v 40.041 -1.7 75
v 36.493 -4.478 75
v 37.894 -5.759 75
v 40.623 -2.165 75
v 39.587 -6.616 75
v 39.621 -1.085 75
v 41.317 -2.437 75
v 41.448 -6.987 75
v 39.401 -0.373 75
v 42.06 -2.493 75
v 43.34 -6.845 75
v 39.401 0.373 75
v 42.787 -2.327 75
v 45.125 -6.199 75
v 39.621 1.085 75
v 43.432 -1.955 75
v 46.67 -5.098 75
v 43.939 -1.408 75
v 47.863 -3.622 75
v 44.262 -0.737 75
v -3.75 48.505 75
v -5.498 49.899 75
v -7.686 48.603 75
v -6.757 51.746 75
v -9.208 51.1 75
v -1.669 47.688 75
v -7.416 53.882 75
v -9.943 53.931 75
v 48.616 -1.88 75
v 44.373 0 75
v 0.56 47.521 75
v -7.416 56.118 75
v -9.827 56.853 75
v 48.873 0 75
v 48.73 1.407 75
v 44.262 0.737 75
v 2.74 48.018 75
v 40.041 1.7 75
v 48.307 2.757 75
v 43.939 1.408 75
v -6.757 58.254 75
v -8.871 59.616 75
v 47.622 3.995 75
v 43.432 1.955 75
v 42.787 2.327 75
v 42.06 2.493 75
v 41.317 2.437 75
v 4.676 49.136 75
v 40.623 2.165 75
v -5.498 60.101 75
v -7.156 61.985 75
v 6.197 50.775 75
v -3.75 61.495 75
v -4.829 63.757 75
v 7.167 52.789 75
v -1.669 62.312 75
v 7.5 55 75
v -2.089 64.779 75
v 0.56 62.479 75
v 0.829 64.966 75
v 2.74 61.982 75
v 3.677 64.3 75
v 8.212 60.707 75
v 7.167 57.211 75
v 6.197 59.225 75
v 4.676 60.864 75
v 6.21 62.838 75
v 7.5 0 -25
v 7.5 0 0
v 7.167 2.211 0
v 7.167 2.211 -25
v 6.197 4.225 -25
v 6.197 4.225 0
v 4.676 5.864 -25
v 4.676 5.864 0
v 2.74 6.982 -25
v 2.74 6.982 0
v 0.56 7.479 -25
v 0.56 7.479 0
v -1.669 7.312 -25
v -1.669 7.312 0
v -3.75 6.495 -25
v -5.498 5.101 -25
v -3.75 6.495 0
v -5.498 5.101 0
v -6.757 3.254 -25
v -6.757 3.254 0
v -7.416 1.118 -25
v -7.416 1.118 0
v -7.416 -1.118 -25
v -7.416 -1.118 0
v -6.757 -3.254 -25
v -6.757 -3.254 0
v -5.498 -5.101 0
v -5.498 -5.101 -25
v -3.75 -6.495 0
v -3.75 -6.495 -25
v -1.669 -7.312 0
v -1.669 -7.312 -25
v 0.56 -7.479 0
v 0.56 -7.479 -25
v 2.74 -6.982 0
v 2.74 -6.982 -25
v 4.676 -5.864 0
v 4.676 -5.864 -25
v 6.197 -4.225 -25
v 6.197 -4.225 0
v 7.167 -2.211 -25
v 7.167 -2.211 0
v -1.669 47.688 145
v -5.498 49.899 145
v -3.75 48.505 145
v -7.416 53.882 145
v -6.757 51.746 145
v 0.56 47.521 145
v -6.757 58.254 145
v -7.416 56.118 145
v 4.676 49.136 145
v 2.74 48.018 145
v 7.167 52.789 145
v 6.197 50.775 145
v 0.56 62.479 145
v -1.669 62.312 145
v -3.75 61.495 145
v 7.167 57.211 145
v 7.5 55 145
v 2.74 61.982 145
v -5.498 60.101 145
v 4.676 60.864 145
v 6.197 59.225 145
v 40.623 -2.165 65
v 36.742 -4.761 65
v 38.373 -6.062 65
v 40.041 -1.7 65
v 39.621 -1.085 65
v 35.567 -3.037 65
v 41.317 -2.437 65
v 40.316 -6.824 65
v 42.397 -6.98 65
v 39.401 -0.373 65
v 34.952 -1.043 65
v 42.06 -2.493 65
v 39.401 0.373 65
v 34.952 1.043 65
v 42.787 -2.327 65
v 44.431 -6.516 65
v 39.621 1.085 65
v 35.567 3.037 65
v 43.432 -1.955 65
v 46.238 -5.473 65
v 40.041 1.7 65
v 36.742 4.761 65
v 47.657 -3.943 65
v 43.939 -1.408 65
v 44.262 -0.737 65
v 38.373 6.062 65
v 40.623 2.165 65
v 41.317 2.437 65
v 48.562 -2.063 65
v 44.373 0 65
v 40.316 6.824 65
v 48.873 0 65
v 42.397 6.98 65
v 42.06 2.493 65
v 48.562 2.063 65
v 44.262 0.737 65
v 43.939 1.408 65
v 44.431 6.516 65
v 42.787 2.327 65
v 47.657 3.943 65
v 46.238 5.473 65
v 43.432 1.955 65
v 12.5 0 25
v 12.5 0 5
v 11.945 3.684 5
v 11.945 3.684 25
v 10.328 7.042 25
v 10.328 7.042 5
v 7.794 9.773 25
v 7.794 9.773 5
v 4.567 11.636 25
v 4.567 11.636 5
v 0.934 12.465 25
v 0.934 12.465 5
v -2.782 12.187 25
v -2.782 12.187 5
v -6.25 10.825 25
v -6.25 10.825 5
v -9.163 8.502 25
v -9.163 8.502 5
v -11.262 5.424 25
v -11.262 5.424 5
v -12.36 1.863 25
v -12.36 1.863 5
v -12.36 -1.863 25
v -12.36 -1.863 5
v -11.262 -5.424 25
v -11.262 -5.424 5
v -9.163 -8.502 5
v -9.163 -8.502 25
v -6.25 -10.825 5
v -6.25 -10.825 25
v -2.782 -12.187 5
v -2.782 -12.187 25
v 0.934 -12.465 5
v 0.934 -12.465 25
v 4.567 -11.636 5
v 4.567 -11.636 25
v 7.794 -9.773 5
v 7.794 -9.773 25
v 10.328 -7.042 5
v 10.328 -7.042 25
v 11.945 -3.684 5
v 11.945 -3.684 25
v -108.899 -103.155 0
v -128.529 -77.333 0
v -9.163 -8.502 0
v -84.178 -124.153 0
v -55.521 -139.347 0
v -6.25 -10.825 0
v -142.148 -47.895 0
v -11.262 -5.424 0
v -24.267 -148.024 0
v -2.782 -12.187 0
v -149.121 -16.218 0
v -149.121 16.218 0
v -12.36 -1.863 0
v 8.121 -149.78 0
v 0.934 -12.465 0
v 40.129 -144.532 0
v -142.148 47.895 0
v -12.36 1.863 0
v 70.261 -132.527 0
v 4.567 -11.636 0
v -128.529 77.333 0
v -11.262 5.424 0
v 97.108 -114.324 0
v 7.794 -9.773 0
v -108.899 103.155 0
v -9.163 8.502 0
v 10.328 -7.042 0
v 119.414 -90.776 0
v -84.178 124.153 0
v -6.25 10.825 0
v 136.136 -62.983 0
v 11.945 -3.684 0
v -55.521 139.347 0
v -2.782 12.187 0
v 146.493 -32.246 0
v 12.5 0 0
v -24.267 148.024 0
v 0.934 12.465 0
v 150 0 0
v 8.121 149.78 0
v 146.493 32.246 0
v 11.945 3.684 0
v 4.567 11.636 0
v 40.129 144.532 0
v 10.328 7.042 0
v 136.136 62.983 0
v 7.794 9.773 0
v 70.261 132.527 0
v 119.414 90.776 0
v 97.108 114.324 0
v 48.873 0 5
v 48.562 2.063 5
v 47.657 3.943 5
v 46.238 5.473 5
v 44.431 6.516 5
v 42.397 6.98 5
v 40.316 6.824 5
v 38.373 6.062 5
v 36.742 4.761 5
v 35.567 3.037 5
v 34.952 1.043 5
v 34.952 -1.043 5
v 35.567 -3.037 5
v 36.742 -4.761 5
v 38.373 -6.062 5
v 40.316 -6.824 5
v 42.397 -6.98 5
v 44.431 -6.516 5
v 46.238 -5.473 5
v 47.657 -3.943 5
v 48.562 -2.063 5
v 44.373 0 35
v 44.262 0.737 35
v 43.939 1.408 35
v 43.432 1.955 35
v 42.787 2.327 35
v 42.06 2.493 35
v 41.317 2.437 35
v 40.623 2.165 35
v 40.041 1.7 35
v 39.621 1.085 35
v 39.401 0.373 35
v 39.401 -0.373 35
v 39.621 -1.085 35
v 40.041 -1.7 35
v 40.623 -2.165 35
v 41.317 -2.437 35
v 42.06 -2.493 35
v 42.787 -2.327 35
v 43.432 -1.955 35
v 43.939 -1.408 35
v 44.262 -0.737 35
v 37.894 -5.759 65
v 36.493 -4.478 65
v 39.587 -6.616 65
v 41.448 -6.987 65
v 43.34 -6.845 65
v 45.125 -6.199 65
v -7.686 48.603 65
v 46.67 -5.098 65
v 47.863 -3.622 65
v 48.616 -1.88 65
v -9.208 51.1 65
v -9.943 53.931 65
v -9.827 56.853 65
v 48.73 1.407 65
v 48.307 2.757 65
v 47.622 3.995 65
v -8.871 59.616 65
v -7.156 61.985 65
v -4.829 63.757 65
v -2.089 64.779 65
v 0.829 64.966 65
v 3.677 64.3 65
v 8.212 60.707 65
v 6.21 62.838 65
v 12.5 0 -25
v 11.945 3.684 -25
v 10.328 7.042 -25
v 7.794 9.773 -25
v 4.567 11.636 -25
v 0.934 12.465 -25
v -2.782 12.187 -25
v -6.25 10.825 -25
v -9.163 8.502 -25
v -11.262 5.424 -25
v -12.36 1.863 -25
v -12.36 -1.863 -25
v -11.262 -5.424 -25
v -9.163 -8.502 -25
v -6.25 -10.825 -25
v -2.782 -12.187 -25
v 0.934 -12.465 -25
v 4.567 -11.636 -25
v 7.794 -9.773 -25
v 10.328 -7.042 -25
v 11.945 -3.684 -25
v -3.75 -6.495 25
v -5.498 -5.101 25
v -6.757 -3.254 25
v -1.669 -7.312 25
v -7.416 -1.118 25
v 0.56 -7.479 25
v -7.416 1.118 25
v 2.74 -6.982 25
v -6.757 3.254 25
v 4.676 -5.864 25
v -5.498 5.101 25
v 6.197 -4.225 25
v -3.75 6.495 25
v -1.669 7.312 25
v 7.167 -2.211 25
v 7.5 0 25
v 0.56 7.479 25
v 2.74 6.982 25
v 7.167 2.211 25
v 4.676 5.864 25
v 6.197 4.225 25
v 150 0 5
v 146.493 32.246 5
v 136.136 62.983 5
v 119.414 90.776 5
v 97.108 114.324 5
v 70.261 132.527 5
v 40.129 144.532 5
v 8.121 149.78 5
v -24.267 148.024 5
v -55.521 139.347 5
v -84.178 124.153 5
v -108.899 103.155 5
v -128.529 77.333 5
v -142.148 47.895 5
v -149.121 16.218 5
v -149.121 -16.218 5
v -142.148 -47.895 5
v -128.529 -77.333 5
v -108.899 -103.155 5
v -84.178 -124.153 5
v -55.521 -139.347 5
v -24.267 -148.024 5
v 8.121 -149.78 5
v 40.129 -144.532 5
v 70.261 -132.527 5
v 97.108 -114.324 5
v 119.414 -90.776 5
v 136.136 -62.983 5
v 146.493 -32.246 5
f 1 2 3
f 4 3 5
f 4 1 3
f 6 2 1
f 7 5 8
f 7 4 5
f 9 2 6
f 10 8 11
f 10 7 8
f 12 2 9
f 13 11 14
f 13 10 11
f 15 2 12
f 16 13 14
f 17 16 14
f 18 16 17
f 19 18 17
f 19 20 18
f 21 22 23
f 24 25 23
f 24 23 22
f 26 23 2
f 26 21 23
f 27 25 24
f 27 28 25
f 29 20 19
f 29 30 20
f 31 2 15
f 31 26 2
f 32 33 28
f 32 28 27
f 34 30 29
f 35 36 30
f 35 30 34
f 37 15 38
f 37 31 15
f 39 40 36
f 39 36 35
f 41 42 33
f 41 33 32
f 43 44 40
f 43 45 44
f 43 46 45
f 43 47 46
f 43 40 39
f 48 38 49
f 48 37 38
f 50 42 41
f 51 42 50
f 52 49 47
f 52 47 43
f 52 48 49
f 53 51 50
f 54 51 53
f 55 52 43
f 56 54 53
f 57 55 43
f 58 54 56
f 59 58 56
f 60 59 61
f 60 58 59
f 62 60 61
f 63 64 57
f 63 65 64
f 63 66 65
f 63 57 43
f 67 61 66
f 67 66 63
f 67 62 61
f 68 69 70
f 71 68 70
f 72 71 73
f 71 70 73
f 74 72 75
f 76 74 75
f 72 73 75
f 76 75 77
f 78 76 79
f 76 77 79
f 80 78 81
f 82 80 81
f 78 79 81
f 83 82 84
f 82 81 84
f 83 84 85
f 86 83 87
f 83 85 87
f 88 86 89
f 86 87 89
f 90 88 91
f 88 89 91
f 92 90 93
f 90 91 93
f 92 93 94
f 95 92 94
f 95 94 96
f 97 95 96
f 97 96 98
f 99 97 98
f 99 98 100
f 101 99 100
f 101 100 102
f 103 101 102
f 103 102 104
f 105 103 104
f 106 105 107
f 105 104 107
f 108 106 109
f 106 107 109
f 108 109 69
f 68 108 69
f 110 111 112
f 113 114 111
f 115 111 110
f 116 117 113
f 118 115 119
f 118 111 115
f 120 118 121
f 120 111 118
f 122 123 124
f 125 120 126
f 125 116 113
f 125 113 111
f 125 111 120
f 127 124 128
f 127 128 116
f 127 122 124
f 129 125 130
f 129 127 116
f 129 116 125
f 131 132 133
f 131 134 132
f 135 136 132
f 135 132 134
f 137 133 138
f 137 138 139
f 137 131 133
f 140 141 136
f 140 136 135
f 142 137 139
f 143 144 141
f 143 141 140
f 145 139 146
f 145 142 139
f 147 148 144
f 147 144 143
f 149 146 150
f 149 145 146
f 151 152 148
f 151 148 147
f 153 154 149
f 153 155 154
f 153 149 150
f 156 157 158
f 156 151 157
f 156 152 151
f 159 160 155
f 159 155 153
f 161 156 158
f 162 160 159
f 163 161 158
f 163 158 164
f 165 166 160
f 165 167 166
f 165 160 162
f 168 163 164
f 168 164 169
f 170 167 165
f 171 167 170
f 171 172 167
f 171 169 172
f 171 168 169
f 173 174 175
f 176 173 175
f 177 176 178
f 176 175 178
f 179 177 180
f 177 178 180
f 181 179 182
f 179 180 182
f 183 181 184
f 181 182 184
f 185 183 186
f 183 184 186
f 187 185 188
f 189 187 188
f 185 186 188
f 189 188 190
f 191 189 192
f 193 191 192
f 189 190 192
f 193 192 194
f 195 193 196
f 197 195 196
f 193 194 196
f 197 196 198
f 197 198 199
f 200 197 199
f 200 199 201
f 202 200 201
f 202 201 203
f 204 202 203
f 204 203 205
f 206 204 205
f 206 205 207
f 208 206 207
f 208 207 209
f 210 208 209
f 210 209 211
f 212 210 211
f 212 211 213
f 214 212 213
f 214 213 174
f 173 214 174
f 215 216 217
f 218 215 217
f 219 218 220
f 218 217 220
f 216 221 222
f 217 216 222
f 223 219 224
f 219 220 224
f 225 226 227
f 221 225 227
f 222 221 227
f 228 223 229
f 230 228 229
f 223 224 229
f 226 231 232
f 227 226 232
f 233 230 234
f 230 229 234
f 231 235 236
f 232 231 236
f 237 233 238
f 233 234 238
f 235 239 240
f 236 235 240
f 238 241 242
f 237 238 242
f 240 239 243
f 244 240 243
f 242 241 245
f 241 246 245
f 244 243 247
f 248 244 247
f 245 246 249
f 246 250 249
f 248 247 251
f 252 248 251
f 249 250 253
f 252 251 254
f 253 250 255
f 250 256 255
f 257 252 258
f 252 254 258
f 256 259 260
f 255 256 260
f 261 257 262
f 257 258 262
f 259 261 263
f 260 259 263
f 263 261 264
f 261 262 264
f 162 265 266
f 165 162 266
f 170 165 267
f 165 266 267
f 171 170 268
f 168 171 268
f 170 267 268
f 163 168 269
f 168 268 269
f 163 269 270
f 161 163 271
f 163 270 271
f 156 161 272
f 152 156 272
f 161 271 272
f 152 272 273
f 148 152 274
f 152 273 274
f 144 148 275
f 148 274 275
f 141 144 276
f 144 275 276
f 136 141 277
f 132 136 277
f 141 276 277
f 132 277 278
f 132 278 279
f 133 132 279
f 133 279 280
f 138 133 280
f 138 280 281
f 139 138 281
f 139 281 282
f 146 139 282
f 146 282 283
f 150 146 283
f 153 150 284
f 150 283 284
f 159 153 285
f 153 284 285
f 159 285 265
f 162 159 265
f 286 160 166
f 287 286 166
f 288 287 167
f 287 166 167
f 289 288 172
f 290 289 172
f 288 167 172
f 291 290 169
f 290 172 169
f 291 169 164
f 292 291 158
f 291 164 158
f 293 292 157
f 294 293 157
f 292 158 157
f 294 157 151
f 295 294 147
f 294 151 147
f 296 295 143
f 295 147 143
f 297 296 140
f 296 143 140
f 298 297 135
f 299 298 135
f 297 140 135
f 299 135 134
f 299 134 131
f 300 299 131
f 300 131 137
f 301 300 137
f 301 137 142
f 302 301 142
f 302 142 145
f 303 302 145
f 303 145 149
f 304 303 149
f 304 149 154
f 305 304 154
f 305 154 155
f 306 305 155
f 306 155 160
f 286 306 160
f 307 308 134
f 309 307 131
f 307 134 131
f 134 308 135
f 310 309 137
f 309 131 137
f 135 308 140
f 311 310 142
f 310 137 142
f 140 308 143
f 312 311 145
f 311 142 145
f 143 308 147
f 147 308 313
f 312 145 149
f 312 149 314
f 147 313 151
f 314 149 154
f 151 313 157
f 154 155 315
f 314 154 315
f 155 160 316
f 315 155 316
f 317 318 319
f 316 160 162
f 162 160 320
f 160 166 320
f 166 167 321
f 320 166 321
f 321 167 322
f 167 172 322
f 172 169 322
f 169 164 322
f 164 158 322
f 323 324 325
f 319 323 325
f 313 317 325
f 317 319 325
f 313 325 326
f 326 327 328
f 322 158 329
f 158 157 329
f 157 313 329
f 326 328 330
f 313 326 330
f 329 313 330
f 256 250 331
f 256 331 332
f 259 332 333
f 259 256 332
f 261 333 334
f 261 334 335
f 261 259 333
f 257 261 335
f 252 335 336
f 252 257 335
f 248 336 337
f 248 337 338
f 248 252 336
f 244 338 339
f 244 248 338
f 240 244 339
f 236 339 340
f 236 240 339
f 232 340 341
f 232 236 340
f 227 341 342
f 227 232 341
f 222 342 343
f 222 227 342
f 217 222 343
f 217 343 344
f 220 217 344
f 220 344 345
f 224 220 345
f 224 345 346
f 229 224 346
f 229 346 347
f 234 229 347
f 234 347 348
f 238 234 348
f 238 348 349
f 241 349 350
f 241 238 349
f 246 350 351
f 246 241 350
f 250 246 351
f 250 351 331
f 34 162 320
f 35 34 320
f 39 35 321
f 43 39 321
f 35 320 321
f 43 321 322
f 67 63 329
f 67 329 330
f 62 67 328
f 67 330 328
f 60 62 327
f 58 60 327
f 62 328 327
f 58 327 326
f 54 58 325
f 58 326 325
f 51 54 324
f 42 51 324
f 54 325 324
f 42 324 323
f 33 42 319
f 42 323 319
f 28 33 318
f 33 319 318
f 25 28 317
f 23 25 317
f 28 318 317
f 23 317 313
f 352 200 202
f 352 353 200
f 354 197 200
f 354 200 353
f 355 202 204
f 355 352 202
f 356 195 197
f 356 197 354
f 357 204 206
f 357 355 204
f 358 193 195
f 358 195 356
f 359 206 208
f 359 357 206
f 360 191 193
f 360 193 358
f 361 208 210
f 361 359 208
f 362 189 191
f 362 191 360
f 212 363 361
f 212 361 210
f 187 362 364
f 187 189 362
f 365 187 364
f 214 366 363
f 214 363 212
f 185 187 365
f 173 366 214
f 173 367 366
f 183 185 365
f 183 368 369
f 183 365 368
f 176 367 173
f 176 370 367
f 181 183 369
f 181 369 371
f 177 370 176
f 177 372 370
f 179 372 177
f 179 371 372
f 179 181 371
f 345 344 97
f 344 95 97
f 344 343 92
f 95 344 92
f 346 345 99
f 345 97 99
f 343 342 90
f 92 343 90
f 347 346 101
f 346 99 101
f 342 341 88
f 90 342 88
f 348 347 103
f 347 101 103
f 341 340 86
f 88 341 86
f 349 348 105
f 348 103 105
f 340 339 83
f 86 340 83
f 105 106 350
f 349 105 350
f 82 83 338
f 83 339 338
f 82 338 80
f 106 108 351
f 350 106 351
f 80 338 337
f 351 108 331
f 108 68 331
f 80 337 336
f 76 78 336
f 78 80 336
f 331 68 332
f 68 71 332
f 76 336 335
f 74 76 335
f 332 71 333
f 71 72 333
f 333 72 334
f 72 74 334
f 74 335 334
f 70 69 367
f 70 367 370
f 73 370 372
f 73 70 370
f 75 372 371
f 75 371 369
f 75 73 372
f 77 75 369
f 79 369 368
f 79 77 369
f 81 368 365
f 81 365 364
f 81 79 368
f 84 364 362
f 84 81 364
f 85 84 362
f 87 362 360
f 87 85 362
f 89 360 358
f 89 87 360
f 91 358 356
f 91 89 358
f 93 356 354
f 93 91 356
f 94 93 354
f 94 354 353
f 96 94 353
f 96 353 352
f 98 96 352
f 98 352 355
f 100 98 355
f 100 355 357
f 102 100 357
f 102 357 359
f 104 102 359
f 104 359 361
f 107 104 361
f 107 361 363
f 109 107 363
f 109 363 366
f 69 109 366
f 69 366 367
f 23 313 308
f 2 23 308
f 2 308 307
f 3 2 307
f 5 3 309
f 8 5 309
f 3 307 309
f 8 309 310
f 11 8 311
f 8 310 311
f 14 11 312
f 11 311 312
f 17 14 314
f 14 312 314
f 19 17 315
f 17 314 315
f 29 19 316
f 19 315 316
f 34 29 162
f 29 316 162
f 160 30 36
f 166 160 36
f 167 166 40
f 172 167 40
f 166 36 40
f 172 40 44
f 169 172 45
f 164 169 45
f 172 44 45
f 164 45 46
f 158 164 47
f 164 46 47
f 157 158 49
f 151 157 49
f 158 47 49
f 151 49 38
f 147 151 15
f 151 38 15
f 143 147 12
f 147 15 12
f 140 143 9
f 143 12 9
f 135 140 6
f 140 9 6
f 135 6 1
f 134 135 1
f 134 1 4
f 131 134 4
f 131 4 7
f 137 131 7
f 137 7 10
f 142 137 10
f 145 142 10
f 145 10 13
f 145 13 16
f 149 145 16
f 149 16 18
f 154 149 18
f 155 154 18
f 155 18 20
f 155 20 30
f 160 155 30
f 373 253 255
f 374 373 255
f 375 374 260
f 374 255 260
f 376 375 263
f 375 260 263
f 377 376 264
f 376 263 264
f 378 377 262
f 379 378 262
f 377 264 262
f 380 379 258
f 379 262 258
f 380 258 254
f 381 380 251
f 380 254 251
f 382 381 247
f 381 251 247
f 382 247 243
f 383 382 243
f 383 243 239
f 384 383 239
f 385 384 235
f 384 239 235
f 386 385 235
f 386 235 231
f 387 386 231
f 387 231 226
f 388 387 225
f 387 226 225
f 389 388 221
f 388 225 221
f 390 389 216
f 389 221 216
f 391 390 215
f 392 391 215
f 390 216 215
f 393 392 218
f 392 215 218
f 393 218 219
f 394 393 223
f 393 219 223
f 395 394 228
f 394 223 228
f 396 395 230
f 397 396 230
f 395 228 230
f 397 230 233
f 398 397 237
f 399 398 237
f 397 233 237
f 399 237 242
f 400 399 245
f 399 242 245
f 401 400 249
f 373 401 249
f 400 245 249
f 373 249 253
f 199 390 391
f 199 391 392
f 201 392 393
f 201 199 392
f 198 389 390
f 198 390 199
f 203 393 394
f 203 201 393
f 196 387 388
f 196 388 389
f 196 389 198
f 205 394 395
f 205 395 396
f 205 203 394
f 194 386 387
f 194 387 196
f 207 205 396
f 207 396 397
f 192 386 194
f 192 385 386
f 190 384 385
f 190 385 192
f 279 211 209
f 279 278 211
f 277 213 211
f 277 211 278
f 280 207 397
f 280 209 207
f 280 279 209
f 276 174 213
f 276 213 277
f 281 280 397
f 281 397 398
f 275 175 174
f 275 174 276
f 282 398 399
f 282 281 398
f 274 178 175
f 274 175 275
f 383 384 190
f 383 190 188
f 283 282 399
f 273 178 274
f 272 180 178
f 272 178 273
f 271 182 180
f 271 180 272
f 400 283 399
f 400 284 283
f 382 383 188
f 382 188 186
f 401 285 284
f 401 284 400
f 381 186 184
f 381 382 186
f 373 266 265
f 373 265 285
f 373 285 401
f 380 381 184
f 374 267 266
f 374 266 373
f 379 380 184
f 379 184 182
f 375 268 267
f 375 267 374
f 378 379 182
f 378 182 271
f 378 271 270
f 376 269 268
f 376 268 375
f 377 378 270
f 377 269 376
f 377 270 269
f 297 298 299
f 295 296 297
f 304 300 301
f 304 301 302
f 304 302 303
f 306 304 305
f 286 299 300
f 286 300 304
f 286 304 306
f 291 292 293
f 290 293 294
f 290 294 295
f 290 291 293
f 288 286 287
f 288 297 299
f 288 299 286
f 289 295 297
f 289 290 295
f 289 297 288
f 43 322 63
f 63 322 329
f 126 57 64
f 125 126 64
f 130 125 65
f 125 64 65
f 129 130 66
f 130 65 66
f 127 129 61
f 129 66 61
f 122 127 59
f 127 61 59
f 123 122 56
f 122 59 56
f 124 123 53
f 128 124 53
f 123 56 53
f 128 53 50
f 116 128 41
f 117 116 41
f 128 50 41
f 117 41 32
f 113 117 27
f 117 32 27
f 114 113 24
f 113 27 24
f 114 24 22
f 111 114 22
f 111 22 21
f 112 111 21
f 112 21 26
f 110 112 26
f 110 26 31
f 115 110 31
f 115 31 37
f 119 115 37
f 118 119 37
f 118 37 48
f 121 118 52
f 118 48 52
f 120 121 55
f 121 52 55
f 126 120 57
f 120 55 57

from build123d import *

# Parameters (mm, degrees)
F0_R      = 150
F1_DEPTH  = 5
F2_R      = 7.5
F3_DEPTH  = 5.001
F2_R_2    = 12.5
F4_DEPTH  = 25
F5_DEPTH  = 25
F6_R      = 7
F7_DEPTH  = 60
F9_DEPTH  = 10
F10_R     = 7.5
F11_DEPTH = 70
F12_R     = 2.5
F13_DEPTH = 40


with BuildPart() as f1:
    # F0 (on Top) → F1 (new body)
    with BuildSketch(Plane.XY):
        Circle(F0_R)
    extrude(amount=F1_DEPTH)

    # F2 (on Top) → F3 (cut, through all)
    with BuildSketch(Plane.XY):
        Circle(F2_R)
    extrude(amount=F3_DEPTH, mode=Mode.SUBTRACT)

    # F2 (on Top) → F4 (join)
    with BuildSketch(Plane.XY):
        Circle(F2_R_2)
        Circle(F2_R, mode=Mode.SUBTRACT)
    extrude(amount=F4_DEPTH)

    # F2 (on Top) → F5 (join)
    with BuildSketch(Plane.XY):
        Circle(F2_R_2)
        Circle(F2_R, mode=Mode.SUBTRACT)
    extrude(amount=-F5_DEPTH)

    # F6 (on face) → F7 (join)
    with BuildSketch(Plane.XY.offset(5)):
        with Locations((41.87339, 0)):
            Circle(F6_R)
    extrude(amount=F7_DEPTH)


with BuildPart() as f9:
    # F8 (on face) → F9 (new body)
    with BuildSketch(Plane.XY.offset(65)):
        with BuildLine():
            ThreePointArc((-7.686115, 48.602842), (3.401386, 45.596247), (10, 55))
            ThreePointArc((10, 55), (9.54251, 57.990066), (8.211901, 60.706548))
            ThreePointArc((8.211901, 60.706548), (-6.05756, 62.956504), (-7.686115, 48.602842))
        make_face()
        with BuildLine():
            ThreePointArc((8.211901, 60.706548), (9.54251, 57.990066), (10, 55))
            ThreePointArc((10, 55), (3.401386, 45.596247), (-7.686115, 48.602842))
            Line((-7.686115, 48.602842), (36.493109, -4.478011))
            ThreePointArc((36.493109, -4.478011), (37.633098, 5.569553), (47.621721, 3.994583))
            Line((47.621721, 3.994583), (8.211901, 60.706548))
        make_face()
        with BuildLine():
            ThreePointArc((48.87339, 0), (48.553147, 2.093046), (47.621721, 3.994583))
            ThreePointArc((47.621721, 3.994583), (37.633098, 5.569553), (36.493109, -4.478011))
            ThreePointArc((36.493109, -4.478011), (44.25436, -6.582627), (48.87339, 0))
        make_face()
    extrude(amount=F9_DEPTH)

    # F10 (on face) → F11 (join)
    with BuildSketch(Plane.XY.offset(75)):
        with Locations((0, 55)):
            Circle(F10_R)
    extrude(amount=F11_DEPTH)


with BuildPart() as f13_tool:
    # F12 (on face) → F13 (new body)
    with BuildSketch(Plane.XY.offset(75)):
        with Locations((41.87339, 0)):
            Circle(F12_R)
    extrude(amount=-F13_DEPTH)


with BuildPart() as f1_1:
    add(f1.part)

    # F13: cut by f13_tool
    add(f13_tool.part, mode=Mode.SUBTRACT)


with BuildPart() as f9_1:
    add(f9.part)

    # F13: cut by f13_tool
    add(f13_tool.part, mode=Mode.SUBTRACT)


solid = Compound([f1_1.part, f9_1.part])
